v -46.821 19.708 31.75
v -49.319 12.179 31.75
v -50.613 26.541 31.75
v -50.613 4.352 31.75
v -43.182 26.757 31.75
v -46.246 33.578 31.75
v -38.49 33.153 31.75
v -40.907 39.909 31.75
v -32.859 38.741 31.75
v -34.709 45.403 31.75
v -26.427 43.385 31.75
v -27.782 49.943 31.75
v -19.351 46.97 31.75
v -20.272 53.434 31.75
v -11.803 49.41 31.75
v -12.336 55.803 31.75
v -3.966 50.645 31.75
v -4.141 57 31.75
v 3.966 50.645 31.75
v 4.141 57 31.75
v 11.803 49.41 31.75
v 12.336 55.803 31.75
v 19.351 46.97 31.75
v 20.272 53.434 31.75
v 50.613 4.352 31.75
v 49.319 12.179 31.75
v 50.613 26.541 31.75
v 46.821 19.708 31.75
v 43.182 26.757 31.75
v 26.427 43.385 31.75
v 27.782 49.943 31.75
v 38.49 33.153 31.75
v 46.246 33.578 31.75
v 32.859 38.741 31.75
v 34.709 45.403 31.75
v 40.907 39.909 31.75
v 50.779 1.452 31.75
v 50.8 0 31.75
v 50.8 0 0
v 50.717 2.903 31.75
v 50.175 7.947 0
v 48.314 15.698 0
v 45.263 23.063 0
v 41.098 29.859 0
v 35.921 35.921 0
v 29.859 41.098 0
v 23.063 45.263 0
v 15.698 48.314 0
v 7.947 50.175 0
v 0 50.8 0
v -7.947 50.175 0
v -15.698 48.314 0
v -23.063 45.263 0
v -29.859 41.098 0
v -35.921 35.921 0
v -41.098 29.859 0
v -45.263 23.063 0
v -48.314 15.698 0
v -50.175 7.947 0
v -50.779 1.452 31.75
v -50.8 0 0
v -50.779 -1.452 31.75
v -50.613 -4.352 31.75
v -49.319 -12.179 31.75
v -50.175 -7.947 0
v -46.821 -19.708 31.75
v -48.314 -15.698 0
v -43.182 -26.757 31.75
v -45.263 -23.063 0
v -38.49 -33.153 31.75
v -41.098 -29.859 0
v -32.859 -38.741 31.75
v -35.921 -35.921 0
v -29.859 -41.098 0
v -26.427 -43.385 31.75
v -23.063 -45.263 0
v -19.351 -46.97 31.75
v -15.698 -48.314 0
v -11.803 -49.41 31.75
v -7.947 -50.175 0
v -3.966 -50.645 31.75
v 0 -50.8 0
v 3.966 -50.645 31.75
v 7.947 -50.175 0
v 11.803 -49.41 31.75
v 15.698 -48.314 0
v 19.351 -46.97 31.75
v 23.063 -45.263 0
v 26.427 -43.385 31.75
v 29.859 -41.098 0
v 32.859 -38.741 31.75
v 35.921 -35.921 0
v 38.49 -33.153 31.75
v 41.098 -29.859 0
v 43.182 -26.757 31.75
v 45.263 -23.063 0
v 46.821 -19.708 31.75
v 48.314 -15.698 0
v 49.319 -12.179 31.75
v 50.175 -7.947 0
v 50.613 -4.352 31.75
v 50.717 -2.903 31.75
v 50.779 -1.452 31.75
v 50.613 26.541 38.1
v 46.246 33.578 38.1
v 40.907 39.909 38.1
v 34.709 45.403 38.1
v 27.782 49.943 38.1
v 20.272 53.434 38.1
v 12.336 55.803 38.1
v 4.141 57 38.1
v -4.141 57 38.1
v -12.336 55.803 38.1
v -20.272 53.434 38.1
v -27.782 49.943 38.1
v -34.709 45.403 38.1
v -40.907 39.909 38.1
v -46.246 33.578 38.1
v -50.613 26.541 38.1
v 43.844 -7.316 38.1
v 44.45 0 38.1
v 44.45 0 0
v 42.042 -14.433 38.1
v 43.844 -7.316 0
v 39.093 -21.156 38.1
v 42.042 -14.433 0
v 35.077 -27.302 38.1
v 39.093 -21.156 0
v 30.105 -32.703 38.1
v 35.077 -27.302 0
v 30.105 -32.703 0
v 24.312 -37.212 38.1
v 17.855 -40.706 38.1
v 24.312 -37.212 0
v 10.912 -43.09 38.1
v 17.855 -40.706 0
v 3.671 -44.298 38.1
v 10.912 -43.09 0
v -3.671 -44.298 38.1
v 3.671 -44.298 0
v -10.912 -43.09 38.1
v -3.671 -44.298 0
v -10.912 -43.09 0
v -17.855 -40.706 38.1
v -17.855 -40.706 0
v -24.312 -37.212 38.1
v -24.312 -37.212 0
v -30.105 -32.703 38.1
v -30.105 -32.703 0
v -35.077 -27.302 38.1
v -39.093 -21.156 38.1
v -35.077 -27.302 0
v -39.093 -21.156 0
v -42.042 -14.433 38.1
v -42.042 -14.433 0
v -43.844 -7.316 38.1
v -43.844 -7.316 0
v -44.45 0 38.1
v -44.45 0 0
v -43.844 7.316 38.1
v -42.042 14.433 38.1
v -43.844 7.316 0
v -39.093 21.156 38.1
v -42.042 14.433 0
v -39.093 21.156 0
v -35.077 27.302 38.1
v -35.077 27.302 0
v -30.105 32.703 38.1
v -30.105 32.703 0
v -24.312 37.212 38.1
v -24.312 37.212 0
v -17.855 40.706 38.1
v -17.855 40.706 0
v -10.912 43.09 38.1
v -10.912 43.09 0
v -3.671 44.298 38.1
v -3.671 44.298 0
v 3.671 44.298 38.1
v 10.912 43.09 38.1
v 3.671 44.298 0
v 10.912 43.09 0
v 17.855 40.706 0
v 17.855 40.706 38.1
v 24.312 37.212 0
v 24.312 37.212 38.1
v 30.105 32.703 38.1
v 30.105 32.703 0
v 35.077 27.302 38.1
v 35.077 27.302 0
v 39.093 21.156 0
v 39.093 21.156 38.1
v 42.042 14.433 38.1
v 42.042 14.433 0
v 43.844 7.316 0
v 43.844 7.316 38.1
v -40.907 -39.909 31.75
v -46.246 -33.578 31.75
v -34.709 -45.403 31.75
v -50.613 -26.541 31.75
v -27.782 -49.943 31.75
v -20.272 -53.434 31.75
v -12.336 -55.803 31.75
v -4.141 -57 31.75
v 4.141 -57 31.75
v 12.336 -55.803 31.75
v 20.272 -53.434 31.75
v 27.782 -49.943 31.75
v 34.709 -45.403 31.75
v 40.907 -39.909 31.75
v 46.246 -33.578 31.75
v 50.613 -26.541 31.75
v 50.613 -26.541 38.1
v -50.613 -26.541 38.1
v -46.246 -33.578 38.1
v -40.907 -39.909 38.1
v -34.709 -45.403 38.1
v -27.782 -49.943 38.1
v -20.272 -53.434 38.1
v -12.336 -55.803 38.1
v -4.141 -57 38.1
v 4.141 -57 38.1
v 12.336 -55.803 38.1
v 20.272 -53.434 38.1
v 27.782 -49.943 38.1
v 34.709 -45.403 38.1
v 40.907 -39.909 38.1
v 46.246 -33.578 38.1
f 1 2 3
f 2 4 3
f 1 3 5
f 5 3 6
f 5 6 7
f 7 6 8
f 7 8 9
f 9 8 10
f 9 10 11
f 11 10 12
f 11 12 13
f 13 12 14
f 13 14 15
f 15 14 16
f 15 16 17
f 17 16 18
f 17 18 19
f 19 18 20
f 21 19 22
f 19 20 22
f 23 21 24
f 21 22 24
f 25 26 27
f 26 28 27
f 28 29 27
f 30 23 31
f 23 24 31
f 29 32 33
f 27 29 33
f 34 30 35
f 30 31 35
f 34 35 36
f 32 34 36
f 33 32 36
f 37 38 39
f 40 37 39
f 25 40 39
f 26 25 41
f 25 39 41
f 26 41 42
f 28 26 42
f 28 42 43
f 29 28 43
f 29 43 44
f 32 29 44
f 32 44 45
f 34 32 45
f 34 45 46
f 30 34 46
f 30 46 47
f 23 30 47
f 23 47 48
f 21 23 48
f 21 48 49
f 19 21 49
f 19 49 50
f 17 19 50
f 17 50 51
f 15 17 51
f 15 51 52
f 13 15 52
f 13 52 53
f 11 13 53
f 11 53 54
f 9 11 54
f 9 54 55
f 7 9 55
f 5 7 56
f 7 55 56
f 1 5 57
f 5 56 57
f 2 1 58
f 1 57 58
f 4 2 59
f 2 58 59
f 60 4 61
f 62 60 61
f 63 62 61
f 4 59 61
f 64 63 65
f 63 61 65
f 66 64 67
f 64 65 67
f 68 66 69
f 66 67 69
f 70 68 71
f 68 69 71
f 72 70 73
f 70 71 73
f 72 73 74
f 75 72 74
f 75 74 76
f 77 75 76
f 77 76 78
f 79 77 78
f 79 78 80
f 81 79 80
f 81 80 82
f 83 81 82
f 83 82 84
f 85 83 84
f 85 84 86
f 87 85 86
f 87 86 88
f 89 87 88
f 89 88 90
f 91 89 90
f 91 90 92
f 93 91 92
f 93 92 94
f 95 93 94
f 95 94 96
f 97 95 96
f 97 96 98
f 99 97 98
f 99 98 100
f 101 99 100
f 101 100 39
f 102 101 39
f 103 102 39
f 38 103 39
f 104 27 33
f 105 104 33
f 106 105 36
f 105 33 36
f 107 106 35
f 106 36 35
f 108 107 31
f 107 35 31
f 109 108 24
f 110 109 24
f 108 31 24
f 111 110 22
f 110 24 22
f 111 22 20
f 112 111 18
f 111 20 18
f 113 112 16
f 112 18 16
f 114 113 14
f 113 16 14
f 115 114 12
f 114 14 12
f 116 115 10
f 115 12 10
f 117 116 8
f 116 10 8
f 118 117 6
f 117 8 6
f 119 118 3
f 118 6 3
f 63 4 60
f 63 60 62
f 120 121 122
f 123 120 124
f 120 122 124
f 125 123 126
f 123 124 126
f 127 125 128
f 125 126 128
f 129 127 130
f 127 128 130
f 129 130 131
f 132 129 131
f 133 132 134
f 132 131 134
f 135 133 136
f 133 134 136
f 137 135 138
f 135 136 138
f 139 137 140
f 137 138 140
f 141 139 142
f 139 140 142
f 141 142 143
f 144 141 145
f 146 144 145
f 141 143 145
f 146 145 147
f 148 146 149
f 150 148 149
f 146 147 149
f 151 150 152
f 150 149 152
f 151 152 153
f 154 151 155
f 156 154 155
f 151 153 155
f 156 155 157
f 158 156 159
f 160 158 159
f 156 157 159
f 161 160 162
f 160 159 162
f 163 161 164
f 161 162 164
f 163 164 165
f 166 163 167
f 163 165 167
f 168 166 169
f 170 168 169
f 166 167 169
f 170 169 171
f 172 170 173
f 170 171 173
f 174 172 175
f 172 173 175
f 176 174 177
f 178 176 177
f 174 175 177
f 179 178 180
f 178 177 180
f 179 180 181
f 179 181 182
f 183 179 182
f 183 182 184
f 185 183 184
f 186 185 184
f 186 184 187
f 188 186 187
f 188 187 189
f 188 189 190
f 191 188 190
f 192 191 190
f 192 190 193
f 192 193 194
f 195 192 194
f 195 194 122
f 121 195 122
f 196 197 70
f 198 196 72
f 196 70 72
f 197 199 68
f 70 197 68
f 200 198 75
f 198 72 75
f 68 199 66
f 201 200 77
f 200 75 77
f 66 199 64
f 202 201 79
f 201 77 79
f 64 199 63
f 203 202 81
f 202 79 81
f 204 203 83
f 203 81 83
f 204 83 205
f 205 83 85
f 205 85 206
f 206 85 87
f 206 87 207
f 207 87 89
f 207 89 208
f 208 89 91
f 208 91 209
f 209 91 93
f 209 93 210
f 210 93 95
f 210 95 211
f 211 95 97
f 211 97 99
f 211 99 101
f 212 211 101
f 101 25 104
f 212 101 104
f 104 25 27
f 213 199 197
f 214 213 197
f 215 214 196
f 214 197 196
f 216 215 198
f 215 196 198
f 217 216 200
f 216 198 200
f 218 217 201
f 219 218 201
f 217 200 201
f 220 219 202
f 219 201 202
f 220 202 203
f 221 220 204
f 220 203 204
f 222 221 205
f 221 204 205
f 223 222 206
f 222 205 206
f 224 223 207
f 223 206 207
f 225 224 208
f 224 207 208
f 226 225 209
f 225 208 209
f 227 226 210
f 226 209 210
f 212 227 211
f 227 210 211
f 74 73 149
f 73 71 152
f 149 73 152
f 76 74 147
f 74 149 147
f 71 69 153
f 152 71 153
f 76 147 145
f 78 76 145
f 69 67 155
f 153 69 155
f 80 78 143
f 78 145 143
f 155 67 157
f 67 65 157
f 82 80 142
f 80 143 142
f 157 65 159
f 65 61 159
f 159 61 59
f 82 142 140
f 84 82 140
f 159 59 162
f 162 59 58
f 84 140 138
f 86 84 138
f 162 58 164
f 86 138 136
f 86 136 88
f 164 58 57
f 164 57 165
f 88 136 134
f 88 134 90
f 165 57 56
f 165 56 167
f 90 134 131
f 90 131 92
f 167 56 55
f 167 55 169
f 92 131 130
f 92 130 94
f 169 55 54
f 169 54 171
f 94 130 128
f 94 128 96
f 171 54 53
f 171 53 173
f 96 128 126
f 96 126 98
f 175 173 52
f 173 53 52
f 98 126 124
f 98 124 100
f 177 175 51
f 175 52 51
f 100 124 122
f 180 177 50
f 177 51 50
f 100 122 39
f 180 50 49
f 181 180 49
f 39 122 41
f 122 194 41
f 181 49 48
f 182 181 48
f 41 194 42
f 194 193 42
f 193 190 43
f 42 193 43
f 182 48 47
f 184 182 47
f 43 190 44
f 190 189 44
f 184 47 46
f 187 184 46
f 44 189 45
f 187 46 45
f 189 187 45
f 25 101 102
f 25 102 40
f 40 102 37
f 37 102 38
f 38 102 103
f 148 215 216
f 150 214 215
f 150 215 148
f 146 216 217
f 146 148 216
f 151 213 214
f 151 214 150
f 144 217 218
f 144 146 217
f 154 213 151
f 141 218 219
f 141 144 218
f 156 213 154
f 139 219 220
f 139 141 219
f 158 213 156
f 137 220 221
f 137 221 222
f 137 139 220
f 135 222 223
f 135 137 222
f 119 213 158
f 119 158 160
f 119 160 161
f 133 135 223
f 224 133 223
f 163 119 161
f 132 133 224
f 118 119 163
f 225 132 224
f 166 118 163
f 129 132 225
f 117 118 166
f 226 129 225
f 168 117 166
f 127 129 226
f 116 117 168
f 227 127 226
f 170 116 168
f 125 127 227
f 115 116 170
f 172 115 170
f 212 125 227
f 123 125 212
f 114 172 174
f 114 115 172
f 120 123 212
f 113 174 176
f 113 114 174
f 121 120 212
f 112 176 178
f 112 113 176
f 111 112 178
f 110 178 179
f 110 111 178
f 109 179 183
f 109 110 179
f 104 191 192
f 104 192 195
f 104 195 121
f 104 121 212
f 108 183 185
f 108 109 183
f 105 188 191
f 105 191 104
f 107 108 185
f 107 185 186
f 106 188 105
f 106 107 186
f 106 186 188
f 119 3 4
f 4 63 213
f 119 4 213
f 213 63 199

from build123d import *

# Parameters (mm, degrees)
F0_R     = 50.8
F0_R_2   = 44.45
F1_DEPTH = 31.75
F3_DEPTH = 6.35
F4_R     = 44.45
F5_DEPTH = 25.4


with BuildPart() as f1:
    # F0 (on Top) → F1 (new body)
    with BuildSketch(Plane.XY):
        Circle(F0_R)
        Circle(F0_R_2, mode=Mode.SUBTRACT)
    extrude(amount=F1_DEPTH)

    # F2 (on face) → F3 (join)
    with BuildSketch(Plane.XY.offset(31.75)):
        with BuildLine():
            Line((-50.613235, -1.072882), (-50.613235, -26.540967))
            ThreePointArc((-50.613235, -26.540967), (0, -57.15), (50.613235, -26.540967))
            Line((50.613235, -26.540967), (50.613235, 26.540967))
            ThreePointArc((50.613235, 26.540967), (0, 57.15), (-50.613235, 26.540967))
            Line((-50.613235, 26.540967), (-50.613235, -1.072882))
        make_face()
    extrude(amount=F3_DEPTH)

    # F4 (on face) → F5 (cut)
    with BuildSketch(Plane(origin=(0, 0, 31.75), x_dir=(1, 0, 0), z_dir=(0, 0, -1))):
        Circle(F4_R)
    extrude(amount=-F5_DEPTH, mode=Mode.SUBTRACT)


solid = f1.part
